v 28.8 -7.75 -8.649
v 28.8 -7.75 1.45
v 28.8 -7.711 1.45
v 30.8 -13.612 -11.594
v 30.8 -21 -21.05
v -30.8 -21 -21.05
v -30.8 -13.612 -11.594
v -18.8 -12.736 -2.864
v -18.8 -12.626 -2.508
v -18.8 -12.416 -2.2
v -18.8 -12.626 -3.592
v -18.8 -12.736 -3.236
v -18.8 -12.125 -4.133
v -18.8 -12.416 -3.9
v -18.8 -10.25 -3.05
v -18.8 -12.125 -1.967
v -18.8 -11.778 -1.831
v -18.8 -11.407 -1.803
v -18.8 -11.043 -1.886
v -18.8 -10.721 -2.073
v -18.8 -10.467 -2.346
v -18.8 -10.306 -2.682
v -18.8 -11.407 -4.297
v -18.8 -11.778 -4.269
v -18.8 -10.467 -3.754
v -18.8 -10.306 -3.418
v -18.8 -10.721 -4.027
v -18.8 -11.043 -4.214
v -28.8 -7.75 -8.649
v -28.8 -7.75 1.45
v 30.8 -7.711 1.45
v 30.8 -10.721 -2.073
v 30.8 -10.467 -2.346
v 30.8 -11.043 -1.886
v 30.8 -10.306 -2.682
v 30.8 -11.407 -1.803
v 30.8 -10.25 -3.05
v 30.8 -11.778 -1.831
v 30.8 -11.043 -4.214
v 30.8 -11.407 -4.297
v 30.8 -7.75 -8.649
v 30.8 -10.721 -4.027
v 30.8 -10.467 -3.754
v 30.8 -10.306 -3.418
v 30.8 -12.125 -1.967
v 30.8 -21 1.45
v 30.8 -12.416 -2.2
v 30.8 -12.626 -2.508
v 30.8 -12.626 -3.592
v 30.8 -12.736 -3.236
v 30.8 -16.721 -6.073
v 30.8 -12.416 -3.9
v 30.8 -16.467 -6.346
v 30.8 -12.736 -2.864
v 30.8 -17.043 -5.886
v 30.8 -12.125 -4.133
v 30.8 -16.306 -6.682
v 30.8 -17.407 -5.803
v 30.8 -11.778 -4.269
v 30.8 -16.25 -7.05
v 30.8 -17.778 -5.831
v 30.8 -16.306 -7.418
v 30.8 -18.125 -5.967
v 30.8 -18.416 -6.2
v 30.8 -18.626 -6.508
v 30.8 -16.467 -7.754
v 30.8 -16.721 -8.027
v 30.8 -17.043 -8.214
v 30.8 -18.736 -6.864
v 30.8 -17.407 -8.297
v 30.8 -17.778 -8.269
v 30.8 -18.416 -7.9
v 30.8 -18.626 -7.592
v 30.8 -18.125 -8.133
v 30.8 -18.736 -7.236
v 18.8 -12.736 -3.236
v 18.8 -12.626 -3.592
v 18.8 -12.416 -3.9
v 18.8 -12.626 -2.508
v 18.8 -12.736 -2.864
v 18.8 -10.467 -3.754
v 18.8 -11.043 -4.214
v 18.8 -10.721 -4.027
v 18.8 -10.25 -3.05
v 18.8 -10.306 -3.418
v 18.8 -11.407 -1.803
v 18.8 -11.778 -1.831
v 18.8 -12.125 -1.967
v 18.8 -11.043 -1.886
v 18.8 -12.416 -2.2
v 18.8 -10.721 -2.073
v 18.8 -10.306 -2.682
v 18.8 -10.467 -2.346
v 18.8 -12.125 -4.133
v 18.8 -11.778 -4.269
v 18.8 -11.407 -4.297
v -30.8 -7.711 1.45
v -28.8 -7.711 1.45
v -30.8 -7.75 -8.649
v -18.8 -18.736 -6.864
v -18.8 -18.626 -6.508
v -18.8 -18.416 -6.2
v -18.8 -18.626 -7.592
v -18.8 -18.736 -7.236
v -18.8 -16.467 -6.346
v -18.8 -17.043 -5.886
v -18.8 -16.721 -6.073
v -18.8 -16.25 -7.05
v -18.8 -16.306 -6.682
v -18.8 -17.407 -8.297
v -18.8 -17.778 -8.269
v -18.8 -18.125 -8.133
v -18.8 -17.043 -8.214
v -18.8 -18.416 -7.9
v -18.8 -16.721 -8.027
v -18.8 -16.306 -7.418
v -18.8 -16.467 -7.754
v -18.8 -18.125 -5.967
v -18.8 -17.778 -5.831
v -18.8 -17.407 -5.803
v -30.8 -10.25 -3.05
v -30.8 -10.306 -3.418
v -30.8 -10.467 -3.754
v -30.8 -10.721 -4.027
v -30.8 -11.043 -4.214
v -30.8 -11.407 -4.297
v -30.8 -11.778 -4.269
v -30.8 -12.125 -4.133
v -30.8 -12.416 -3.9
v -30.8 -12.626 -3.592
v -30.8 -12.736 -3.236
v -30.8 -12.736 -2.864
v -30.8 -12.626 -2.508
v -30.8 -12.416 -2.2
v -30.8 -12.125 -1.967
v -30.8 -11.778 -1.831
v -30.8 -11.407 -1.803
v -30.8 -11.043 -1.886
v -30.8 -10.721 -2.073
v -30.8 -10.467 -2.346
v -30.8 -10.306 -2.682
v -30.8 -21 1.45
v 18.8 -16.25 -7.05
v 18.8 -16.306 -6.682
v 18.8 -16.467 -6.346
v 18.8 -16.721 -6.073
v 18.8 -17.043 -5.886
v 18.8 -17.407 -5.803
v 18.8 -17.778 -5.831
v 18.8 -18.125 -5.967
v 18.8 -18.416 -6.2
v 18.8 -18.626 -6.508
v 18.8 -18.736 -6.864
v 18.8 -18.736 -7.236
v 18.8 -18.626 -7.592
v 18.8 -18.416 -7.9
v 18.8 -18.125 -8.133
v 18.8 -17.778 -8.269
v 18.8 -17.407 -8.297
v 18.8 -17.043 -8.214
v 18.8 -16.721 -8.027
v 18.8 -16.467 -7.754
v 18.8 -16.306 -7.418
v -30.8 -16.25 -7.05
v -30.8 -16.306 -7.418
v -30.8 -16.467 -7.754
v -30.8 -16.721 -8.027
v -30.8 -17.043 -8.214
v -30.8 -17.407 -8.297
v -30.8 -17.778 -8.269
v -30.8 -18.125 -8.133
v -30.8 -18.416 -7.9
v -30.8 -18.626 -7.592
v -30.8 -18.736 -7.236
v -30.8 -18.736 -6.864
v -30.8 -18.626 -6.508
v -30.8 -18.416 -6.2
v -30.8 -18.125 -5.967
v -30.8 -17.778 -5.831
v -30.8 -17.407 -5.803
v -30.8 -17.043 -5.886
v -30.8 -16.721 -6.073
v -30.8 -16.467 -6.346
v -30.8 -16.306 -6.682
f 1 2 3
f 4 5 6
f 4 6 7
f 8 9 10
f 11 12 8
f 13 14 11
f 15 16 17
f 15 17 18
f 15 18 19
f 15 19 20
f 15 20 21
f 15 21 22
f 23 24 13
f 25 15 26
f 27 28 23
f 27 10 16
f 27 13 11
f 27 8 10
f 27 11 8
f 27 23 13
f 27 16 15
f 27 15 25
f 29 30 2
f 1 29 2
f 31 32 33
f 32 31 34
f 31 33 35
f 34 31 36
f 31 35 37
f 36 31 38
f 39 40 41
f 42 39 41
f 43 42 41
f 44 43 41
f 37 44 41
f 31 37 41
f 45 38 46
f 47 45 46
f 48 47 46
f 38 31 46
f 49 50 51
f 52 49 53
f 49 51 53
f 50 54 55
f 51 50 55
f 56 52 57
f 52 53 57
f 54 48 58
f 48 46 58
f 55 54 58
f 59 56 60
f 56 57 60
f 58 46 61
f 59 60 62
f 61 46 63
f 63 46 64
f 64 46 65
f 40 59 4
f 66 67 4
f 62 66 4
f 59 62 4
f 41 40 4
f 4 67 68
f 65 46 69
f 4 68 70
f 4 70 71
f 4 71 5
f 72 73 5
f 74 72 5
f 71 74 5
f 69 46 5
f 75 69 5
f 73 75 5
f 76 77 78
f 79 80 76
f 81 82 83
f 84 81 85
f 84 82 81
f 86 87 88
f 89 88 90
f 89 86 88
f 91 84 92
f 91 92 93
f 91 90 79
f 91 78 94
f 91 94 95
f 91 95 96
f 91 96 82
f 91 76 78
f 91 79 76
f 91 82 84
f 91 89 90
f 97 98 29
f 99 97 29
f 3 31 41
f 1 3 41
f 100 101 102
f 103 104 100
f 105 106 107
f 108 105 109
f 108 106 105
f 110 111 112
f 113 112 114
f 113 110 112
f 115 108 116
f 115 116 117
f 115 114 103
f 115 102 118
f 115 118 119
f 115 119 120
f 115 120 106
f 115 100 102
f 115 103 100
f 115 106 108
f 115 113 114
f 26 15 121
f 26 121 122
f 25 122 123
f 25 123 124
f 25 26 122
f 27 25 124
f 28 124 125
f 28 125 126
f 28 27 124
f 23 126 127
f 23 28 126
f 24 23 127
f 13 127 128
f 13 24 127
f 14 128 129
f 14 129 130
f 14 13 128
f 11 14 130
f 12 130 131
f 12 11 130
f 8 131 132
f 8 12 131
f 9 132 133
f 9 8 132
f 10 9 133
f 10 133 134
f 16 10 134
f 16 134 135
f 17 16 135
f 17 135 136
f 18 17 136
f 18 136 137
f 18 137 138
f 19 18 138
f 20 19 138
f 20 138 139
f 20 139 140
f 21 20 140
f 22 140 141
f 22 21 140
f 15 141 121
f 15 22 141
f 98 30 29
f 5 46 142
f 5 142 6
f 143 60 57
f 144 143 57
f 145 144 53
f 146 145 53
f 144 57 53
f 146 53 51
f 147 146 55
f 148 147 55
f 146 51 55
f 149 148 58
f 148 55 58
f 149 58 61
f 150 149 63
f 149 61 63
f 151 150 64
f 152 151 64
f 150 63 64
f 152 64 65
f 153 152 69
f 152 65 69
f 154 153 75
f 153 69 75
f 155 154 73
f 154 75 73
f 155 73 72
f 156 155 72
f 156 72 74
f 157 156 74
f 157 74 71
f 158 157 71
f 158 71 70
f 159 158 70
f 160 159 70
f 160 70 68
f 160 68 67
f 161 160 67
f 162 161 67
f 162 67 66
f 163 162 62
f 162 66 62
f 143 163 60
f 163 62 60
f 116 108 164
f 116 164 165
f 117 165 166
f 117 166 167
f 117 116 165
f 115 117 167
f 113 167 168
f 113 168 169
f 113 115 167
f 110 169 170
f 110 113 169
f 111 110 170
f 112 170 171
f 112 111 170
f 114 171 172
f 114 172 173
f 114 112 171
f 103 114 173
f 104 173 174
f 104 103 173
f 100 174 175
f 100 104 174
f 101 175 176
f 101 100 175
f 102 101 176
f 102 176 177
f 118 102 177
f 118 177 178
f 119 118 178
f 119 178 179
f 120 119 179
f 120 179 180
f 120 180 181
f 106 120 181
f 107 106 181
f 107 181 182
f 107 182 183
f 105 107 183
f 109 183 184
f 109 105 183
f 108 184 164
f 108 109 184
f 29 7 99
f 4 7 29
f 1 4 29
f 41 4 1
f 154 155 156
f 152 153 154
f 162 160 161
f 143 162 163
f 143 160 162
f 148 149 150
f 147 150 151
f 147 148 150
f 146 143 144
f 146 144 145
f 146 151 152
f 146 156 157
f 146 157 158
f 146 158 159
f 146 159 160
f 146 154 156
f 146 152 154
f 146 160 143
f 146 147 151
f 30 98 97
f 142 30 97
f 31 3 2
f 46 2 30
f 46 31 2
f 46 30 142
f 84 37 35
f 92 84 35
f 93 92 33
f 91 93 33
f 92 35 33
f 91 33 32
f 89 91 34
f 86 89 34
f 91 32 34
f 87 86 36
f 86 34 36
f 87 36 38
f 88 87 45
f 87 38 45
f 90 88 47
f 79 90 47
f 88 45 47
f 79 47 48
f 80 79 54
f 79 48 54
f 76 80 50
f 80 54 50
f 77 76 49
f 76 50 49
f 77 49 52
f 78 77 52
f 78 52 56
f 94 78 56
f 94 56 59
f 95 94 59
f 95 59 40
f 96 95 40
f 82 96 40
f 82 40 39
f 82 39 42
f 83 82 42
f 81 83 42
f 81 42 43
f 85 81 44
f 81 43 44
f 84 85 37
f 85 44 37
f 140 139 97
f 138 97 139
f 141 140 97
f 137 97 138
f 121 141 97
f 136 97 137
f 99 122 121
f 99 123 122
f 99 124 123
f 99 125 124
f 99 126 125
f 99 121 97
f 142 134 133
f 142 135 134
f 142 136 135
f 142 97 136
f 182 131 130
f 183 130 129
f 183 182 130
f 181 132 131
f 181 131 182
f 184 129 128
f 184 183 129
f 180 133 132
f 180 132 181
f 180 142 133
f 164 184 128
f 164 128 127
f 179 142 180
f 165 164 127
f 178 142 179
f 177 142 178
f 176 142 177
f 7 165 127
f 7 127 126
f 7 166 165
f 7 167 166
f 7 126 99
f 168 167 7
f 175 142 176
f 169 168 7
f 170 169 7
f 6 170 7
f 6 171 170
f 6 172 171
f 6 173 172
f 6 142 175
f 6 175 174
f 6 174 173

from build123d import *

# Parameters (mm, degrees)
SKETCH1_R               = 2.15
BOSS_EXTRUDE1_DEPTH     = 31.3
CUT_EXTRUDE1_REACH      = 47.396
SKETCH2_W               = 57.6
SKETCH2_H               = 12
CUT_EXTRUDE3_DEPTH      = 70.302687538
CUT_EXTRUDE4_DEPTH      = 40.979432212
CUT_EXTRUDE4_DEPTH_BACK = 40.979432212
SKETCH9_W               = 62.6
SKETCH9_H               = 52.1
SKETCH9_W_2             = 61.6
SKETCH9_H_2             = 50.1
SKETCH10_R              = 1.25
CUT_EXTRUDE5_DEPTH      = 12
CUT_EXTRUDE6_START      = -12
SKETCH11_R              = 1.25
CUT_EXTRUDE6_DEPTH      = 12


with BuildPart() as part:
    # Sketch1 → Boss-Extrude1 (new, symmetric)
    with BuildSketch(Plane(origin=(0, 0, 0), x_dir=(0, 0, -1), z_dir=(1, 0, 0))):
        with BuildLine():
            Line((-4.25, 0), (-4.25, -4))
            ThreePointArc((-4.25, -4), (-4.105356672, -4.642657212), (-3.699322277, -5.161372987))
            Line((-3.699322277, -5.161372987), (-2.000677723, -6.549868444))
            ThreePointArc((-2.000677723, -6.549868444), (-1.594643328, -7.068584218), (-1.45, -7.71124143))
            Line((-1.45, -7.71124143), (-1.45, -21))
            Line((-1.45, -21), (21.05, -21))
            Line((21.05, -21), (11.593870957, -13.612062296))
            Line((11.593870957, -13.612062296), (3.79776528, 1.907741826))
            ThreePointArc((3.79776528, 1.907741826), (-0.980305452, 4.135396138), (-4.25, 0))
        make_face()
        Circle(SKETCH1_R, mode=Mode.SUBTRACT)
    extrude(amount=BOSS_EXTRUDE1_DEPTH, both=True)

    # Cut-Extrude1: up to this plane
    cut_extrude1_end = Plane(origin=(31.3, -13.612062296, -11.593870957), z_dir=(0, -0.44888042970734693, 0.8935918306619346))
    # Sketch2 → Cut-Extrude1 (cut, up to the surface)
    with BuildSketch(Plane.XY.offset(4.25), mode=Mode.PRIVATE) as cut_extrude1_sk1:
        with Locations((0, -1.75)):
            Rectangle(SKETCH2_W, SKETCH2_H)
    cut_extrude1_tool1 = split(extrude(cut_extrude1_sk1.sketch, amount=-CUT_EXTRUDE1_REACH, mode=Mode.PRIVATE), bisect_by=cut_extrude1_end, keep=Keep.BOTH, mode=Mode.PRIVATE)
    add(cut_extrude1_tool1.solids().sort_by_distance((0, -1.75, 4.25))[0], mode=Mode.SUBTRACT)

    # Sketch8 → Cut-Extrude3 (cut, through all)
    with BuildSketch(Plane(origin=(31.3, 0, 0), x_dir=(0, 0, -1), z_dir=(1, 0, 0))):
        with BuildLine():
            Line((-1.45, -7.71124143), (8.649165161, -7.75))
            Line((8.649165161, -7.75), (3.79776528, 1.907741826))
            ThreePointArc((3.79776528, 1.907741826), (-0.980305452, 4.135396138), (-4.25, 0))
            Line((-4.25, 0), (-4.25, -4))
            ThreePointArc((-4.25, -4), (-4.105356672, -4.642657212), (-3.699322277, -5.161372987))
            Line((-3.699322277, -5.161372987), (-2.000677723, -6.549868444))
            ThreePointArc((-2.000677723, -6.549868444), (-1.594643328, -7.068584218), (-1.45, -7.71124143))
        make_face()
    extrude(amount=-CUT_EXTRUDE3_DEPTH, mode=Mode.SUBTRACT)

    # Sketch9 → Cut-Extrude4 (cut, two sides: drawn at the far end of the back side and taken through both)
    with BuildSketch(Plane(origin=(0, -7.75, 0), x_dir=(1, 0, 0), z_dir=(0, 1, 0)).offset(-CUT_EXTRUDE4_DEPTH_BACK)):
        Rectangle(SKETCH9_W, SKETCH9_H)
        Rectangle(SKETCH9_W_2, SKETCH9_H_2, mode=Mode.SUBTRACT)
    extrude(amount=CUT_EXTRUDE4_DEPTH + CUT_EXTRUDE4_DEPTH_BACK, mode=Mode.SUBTRACT)

    # Sketch10 → Cut-Extrude5 (cut)
    with BuildSketch(Plane(origin=(30.8, 0, 0), x_dir=(0, 0, -1), z_dir=(1, 0, 0))):
        with Locations(Location((3.05, -11.5, 0), (0, 0, 90))):
            Circle(SKETCH10_R)
        with Locations(Location((7.05, -17.5, 0), (0, 0, 90))):
            Circle(SKETCH10_R)
    extrude(amount=-CUT_EXTRUDE5_DEPTH, mode=Mode.SUBTRACT)

    # Sketch11 → Cut-Extrude6 (cut)
    with BuildSketch(Plane.ZY.offset(30.8).offset(CUT_EXTRUDE6_START)):
        with Locations(Location((-7.05, -17.5, 0), (0, 0, 90))):
            Circle(SKETCH11_R)
        with Locations(Location((-3.05, -11.5, 0), (0, 0, 90))):
            Circle(SKETCH11_R)
    extrude(amount=CUT_EXTRUDE6_DEPTH, mode=Mode.SUBTRACT)


solid = part.part
